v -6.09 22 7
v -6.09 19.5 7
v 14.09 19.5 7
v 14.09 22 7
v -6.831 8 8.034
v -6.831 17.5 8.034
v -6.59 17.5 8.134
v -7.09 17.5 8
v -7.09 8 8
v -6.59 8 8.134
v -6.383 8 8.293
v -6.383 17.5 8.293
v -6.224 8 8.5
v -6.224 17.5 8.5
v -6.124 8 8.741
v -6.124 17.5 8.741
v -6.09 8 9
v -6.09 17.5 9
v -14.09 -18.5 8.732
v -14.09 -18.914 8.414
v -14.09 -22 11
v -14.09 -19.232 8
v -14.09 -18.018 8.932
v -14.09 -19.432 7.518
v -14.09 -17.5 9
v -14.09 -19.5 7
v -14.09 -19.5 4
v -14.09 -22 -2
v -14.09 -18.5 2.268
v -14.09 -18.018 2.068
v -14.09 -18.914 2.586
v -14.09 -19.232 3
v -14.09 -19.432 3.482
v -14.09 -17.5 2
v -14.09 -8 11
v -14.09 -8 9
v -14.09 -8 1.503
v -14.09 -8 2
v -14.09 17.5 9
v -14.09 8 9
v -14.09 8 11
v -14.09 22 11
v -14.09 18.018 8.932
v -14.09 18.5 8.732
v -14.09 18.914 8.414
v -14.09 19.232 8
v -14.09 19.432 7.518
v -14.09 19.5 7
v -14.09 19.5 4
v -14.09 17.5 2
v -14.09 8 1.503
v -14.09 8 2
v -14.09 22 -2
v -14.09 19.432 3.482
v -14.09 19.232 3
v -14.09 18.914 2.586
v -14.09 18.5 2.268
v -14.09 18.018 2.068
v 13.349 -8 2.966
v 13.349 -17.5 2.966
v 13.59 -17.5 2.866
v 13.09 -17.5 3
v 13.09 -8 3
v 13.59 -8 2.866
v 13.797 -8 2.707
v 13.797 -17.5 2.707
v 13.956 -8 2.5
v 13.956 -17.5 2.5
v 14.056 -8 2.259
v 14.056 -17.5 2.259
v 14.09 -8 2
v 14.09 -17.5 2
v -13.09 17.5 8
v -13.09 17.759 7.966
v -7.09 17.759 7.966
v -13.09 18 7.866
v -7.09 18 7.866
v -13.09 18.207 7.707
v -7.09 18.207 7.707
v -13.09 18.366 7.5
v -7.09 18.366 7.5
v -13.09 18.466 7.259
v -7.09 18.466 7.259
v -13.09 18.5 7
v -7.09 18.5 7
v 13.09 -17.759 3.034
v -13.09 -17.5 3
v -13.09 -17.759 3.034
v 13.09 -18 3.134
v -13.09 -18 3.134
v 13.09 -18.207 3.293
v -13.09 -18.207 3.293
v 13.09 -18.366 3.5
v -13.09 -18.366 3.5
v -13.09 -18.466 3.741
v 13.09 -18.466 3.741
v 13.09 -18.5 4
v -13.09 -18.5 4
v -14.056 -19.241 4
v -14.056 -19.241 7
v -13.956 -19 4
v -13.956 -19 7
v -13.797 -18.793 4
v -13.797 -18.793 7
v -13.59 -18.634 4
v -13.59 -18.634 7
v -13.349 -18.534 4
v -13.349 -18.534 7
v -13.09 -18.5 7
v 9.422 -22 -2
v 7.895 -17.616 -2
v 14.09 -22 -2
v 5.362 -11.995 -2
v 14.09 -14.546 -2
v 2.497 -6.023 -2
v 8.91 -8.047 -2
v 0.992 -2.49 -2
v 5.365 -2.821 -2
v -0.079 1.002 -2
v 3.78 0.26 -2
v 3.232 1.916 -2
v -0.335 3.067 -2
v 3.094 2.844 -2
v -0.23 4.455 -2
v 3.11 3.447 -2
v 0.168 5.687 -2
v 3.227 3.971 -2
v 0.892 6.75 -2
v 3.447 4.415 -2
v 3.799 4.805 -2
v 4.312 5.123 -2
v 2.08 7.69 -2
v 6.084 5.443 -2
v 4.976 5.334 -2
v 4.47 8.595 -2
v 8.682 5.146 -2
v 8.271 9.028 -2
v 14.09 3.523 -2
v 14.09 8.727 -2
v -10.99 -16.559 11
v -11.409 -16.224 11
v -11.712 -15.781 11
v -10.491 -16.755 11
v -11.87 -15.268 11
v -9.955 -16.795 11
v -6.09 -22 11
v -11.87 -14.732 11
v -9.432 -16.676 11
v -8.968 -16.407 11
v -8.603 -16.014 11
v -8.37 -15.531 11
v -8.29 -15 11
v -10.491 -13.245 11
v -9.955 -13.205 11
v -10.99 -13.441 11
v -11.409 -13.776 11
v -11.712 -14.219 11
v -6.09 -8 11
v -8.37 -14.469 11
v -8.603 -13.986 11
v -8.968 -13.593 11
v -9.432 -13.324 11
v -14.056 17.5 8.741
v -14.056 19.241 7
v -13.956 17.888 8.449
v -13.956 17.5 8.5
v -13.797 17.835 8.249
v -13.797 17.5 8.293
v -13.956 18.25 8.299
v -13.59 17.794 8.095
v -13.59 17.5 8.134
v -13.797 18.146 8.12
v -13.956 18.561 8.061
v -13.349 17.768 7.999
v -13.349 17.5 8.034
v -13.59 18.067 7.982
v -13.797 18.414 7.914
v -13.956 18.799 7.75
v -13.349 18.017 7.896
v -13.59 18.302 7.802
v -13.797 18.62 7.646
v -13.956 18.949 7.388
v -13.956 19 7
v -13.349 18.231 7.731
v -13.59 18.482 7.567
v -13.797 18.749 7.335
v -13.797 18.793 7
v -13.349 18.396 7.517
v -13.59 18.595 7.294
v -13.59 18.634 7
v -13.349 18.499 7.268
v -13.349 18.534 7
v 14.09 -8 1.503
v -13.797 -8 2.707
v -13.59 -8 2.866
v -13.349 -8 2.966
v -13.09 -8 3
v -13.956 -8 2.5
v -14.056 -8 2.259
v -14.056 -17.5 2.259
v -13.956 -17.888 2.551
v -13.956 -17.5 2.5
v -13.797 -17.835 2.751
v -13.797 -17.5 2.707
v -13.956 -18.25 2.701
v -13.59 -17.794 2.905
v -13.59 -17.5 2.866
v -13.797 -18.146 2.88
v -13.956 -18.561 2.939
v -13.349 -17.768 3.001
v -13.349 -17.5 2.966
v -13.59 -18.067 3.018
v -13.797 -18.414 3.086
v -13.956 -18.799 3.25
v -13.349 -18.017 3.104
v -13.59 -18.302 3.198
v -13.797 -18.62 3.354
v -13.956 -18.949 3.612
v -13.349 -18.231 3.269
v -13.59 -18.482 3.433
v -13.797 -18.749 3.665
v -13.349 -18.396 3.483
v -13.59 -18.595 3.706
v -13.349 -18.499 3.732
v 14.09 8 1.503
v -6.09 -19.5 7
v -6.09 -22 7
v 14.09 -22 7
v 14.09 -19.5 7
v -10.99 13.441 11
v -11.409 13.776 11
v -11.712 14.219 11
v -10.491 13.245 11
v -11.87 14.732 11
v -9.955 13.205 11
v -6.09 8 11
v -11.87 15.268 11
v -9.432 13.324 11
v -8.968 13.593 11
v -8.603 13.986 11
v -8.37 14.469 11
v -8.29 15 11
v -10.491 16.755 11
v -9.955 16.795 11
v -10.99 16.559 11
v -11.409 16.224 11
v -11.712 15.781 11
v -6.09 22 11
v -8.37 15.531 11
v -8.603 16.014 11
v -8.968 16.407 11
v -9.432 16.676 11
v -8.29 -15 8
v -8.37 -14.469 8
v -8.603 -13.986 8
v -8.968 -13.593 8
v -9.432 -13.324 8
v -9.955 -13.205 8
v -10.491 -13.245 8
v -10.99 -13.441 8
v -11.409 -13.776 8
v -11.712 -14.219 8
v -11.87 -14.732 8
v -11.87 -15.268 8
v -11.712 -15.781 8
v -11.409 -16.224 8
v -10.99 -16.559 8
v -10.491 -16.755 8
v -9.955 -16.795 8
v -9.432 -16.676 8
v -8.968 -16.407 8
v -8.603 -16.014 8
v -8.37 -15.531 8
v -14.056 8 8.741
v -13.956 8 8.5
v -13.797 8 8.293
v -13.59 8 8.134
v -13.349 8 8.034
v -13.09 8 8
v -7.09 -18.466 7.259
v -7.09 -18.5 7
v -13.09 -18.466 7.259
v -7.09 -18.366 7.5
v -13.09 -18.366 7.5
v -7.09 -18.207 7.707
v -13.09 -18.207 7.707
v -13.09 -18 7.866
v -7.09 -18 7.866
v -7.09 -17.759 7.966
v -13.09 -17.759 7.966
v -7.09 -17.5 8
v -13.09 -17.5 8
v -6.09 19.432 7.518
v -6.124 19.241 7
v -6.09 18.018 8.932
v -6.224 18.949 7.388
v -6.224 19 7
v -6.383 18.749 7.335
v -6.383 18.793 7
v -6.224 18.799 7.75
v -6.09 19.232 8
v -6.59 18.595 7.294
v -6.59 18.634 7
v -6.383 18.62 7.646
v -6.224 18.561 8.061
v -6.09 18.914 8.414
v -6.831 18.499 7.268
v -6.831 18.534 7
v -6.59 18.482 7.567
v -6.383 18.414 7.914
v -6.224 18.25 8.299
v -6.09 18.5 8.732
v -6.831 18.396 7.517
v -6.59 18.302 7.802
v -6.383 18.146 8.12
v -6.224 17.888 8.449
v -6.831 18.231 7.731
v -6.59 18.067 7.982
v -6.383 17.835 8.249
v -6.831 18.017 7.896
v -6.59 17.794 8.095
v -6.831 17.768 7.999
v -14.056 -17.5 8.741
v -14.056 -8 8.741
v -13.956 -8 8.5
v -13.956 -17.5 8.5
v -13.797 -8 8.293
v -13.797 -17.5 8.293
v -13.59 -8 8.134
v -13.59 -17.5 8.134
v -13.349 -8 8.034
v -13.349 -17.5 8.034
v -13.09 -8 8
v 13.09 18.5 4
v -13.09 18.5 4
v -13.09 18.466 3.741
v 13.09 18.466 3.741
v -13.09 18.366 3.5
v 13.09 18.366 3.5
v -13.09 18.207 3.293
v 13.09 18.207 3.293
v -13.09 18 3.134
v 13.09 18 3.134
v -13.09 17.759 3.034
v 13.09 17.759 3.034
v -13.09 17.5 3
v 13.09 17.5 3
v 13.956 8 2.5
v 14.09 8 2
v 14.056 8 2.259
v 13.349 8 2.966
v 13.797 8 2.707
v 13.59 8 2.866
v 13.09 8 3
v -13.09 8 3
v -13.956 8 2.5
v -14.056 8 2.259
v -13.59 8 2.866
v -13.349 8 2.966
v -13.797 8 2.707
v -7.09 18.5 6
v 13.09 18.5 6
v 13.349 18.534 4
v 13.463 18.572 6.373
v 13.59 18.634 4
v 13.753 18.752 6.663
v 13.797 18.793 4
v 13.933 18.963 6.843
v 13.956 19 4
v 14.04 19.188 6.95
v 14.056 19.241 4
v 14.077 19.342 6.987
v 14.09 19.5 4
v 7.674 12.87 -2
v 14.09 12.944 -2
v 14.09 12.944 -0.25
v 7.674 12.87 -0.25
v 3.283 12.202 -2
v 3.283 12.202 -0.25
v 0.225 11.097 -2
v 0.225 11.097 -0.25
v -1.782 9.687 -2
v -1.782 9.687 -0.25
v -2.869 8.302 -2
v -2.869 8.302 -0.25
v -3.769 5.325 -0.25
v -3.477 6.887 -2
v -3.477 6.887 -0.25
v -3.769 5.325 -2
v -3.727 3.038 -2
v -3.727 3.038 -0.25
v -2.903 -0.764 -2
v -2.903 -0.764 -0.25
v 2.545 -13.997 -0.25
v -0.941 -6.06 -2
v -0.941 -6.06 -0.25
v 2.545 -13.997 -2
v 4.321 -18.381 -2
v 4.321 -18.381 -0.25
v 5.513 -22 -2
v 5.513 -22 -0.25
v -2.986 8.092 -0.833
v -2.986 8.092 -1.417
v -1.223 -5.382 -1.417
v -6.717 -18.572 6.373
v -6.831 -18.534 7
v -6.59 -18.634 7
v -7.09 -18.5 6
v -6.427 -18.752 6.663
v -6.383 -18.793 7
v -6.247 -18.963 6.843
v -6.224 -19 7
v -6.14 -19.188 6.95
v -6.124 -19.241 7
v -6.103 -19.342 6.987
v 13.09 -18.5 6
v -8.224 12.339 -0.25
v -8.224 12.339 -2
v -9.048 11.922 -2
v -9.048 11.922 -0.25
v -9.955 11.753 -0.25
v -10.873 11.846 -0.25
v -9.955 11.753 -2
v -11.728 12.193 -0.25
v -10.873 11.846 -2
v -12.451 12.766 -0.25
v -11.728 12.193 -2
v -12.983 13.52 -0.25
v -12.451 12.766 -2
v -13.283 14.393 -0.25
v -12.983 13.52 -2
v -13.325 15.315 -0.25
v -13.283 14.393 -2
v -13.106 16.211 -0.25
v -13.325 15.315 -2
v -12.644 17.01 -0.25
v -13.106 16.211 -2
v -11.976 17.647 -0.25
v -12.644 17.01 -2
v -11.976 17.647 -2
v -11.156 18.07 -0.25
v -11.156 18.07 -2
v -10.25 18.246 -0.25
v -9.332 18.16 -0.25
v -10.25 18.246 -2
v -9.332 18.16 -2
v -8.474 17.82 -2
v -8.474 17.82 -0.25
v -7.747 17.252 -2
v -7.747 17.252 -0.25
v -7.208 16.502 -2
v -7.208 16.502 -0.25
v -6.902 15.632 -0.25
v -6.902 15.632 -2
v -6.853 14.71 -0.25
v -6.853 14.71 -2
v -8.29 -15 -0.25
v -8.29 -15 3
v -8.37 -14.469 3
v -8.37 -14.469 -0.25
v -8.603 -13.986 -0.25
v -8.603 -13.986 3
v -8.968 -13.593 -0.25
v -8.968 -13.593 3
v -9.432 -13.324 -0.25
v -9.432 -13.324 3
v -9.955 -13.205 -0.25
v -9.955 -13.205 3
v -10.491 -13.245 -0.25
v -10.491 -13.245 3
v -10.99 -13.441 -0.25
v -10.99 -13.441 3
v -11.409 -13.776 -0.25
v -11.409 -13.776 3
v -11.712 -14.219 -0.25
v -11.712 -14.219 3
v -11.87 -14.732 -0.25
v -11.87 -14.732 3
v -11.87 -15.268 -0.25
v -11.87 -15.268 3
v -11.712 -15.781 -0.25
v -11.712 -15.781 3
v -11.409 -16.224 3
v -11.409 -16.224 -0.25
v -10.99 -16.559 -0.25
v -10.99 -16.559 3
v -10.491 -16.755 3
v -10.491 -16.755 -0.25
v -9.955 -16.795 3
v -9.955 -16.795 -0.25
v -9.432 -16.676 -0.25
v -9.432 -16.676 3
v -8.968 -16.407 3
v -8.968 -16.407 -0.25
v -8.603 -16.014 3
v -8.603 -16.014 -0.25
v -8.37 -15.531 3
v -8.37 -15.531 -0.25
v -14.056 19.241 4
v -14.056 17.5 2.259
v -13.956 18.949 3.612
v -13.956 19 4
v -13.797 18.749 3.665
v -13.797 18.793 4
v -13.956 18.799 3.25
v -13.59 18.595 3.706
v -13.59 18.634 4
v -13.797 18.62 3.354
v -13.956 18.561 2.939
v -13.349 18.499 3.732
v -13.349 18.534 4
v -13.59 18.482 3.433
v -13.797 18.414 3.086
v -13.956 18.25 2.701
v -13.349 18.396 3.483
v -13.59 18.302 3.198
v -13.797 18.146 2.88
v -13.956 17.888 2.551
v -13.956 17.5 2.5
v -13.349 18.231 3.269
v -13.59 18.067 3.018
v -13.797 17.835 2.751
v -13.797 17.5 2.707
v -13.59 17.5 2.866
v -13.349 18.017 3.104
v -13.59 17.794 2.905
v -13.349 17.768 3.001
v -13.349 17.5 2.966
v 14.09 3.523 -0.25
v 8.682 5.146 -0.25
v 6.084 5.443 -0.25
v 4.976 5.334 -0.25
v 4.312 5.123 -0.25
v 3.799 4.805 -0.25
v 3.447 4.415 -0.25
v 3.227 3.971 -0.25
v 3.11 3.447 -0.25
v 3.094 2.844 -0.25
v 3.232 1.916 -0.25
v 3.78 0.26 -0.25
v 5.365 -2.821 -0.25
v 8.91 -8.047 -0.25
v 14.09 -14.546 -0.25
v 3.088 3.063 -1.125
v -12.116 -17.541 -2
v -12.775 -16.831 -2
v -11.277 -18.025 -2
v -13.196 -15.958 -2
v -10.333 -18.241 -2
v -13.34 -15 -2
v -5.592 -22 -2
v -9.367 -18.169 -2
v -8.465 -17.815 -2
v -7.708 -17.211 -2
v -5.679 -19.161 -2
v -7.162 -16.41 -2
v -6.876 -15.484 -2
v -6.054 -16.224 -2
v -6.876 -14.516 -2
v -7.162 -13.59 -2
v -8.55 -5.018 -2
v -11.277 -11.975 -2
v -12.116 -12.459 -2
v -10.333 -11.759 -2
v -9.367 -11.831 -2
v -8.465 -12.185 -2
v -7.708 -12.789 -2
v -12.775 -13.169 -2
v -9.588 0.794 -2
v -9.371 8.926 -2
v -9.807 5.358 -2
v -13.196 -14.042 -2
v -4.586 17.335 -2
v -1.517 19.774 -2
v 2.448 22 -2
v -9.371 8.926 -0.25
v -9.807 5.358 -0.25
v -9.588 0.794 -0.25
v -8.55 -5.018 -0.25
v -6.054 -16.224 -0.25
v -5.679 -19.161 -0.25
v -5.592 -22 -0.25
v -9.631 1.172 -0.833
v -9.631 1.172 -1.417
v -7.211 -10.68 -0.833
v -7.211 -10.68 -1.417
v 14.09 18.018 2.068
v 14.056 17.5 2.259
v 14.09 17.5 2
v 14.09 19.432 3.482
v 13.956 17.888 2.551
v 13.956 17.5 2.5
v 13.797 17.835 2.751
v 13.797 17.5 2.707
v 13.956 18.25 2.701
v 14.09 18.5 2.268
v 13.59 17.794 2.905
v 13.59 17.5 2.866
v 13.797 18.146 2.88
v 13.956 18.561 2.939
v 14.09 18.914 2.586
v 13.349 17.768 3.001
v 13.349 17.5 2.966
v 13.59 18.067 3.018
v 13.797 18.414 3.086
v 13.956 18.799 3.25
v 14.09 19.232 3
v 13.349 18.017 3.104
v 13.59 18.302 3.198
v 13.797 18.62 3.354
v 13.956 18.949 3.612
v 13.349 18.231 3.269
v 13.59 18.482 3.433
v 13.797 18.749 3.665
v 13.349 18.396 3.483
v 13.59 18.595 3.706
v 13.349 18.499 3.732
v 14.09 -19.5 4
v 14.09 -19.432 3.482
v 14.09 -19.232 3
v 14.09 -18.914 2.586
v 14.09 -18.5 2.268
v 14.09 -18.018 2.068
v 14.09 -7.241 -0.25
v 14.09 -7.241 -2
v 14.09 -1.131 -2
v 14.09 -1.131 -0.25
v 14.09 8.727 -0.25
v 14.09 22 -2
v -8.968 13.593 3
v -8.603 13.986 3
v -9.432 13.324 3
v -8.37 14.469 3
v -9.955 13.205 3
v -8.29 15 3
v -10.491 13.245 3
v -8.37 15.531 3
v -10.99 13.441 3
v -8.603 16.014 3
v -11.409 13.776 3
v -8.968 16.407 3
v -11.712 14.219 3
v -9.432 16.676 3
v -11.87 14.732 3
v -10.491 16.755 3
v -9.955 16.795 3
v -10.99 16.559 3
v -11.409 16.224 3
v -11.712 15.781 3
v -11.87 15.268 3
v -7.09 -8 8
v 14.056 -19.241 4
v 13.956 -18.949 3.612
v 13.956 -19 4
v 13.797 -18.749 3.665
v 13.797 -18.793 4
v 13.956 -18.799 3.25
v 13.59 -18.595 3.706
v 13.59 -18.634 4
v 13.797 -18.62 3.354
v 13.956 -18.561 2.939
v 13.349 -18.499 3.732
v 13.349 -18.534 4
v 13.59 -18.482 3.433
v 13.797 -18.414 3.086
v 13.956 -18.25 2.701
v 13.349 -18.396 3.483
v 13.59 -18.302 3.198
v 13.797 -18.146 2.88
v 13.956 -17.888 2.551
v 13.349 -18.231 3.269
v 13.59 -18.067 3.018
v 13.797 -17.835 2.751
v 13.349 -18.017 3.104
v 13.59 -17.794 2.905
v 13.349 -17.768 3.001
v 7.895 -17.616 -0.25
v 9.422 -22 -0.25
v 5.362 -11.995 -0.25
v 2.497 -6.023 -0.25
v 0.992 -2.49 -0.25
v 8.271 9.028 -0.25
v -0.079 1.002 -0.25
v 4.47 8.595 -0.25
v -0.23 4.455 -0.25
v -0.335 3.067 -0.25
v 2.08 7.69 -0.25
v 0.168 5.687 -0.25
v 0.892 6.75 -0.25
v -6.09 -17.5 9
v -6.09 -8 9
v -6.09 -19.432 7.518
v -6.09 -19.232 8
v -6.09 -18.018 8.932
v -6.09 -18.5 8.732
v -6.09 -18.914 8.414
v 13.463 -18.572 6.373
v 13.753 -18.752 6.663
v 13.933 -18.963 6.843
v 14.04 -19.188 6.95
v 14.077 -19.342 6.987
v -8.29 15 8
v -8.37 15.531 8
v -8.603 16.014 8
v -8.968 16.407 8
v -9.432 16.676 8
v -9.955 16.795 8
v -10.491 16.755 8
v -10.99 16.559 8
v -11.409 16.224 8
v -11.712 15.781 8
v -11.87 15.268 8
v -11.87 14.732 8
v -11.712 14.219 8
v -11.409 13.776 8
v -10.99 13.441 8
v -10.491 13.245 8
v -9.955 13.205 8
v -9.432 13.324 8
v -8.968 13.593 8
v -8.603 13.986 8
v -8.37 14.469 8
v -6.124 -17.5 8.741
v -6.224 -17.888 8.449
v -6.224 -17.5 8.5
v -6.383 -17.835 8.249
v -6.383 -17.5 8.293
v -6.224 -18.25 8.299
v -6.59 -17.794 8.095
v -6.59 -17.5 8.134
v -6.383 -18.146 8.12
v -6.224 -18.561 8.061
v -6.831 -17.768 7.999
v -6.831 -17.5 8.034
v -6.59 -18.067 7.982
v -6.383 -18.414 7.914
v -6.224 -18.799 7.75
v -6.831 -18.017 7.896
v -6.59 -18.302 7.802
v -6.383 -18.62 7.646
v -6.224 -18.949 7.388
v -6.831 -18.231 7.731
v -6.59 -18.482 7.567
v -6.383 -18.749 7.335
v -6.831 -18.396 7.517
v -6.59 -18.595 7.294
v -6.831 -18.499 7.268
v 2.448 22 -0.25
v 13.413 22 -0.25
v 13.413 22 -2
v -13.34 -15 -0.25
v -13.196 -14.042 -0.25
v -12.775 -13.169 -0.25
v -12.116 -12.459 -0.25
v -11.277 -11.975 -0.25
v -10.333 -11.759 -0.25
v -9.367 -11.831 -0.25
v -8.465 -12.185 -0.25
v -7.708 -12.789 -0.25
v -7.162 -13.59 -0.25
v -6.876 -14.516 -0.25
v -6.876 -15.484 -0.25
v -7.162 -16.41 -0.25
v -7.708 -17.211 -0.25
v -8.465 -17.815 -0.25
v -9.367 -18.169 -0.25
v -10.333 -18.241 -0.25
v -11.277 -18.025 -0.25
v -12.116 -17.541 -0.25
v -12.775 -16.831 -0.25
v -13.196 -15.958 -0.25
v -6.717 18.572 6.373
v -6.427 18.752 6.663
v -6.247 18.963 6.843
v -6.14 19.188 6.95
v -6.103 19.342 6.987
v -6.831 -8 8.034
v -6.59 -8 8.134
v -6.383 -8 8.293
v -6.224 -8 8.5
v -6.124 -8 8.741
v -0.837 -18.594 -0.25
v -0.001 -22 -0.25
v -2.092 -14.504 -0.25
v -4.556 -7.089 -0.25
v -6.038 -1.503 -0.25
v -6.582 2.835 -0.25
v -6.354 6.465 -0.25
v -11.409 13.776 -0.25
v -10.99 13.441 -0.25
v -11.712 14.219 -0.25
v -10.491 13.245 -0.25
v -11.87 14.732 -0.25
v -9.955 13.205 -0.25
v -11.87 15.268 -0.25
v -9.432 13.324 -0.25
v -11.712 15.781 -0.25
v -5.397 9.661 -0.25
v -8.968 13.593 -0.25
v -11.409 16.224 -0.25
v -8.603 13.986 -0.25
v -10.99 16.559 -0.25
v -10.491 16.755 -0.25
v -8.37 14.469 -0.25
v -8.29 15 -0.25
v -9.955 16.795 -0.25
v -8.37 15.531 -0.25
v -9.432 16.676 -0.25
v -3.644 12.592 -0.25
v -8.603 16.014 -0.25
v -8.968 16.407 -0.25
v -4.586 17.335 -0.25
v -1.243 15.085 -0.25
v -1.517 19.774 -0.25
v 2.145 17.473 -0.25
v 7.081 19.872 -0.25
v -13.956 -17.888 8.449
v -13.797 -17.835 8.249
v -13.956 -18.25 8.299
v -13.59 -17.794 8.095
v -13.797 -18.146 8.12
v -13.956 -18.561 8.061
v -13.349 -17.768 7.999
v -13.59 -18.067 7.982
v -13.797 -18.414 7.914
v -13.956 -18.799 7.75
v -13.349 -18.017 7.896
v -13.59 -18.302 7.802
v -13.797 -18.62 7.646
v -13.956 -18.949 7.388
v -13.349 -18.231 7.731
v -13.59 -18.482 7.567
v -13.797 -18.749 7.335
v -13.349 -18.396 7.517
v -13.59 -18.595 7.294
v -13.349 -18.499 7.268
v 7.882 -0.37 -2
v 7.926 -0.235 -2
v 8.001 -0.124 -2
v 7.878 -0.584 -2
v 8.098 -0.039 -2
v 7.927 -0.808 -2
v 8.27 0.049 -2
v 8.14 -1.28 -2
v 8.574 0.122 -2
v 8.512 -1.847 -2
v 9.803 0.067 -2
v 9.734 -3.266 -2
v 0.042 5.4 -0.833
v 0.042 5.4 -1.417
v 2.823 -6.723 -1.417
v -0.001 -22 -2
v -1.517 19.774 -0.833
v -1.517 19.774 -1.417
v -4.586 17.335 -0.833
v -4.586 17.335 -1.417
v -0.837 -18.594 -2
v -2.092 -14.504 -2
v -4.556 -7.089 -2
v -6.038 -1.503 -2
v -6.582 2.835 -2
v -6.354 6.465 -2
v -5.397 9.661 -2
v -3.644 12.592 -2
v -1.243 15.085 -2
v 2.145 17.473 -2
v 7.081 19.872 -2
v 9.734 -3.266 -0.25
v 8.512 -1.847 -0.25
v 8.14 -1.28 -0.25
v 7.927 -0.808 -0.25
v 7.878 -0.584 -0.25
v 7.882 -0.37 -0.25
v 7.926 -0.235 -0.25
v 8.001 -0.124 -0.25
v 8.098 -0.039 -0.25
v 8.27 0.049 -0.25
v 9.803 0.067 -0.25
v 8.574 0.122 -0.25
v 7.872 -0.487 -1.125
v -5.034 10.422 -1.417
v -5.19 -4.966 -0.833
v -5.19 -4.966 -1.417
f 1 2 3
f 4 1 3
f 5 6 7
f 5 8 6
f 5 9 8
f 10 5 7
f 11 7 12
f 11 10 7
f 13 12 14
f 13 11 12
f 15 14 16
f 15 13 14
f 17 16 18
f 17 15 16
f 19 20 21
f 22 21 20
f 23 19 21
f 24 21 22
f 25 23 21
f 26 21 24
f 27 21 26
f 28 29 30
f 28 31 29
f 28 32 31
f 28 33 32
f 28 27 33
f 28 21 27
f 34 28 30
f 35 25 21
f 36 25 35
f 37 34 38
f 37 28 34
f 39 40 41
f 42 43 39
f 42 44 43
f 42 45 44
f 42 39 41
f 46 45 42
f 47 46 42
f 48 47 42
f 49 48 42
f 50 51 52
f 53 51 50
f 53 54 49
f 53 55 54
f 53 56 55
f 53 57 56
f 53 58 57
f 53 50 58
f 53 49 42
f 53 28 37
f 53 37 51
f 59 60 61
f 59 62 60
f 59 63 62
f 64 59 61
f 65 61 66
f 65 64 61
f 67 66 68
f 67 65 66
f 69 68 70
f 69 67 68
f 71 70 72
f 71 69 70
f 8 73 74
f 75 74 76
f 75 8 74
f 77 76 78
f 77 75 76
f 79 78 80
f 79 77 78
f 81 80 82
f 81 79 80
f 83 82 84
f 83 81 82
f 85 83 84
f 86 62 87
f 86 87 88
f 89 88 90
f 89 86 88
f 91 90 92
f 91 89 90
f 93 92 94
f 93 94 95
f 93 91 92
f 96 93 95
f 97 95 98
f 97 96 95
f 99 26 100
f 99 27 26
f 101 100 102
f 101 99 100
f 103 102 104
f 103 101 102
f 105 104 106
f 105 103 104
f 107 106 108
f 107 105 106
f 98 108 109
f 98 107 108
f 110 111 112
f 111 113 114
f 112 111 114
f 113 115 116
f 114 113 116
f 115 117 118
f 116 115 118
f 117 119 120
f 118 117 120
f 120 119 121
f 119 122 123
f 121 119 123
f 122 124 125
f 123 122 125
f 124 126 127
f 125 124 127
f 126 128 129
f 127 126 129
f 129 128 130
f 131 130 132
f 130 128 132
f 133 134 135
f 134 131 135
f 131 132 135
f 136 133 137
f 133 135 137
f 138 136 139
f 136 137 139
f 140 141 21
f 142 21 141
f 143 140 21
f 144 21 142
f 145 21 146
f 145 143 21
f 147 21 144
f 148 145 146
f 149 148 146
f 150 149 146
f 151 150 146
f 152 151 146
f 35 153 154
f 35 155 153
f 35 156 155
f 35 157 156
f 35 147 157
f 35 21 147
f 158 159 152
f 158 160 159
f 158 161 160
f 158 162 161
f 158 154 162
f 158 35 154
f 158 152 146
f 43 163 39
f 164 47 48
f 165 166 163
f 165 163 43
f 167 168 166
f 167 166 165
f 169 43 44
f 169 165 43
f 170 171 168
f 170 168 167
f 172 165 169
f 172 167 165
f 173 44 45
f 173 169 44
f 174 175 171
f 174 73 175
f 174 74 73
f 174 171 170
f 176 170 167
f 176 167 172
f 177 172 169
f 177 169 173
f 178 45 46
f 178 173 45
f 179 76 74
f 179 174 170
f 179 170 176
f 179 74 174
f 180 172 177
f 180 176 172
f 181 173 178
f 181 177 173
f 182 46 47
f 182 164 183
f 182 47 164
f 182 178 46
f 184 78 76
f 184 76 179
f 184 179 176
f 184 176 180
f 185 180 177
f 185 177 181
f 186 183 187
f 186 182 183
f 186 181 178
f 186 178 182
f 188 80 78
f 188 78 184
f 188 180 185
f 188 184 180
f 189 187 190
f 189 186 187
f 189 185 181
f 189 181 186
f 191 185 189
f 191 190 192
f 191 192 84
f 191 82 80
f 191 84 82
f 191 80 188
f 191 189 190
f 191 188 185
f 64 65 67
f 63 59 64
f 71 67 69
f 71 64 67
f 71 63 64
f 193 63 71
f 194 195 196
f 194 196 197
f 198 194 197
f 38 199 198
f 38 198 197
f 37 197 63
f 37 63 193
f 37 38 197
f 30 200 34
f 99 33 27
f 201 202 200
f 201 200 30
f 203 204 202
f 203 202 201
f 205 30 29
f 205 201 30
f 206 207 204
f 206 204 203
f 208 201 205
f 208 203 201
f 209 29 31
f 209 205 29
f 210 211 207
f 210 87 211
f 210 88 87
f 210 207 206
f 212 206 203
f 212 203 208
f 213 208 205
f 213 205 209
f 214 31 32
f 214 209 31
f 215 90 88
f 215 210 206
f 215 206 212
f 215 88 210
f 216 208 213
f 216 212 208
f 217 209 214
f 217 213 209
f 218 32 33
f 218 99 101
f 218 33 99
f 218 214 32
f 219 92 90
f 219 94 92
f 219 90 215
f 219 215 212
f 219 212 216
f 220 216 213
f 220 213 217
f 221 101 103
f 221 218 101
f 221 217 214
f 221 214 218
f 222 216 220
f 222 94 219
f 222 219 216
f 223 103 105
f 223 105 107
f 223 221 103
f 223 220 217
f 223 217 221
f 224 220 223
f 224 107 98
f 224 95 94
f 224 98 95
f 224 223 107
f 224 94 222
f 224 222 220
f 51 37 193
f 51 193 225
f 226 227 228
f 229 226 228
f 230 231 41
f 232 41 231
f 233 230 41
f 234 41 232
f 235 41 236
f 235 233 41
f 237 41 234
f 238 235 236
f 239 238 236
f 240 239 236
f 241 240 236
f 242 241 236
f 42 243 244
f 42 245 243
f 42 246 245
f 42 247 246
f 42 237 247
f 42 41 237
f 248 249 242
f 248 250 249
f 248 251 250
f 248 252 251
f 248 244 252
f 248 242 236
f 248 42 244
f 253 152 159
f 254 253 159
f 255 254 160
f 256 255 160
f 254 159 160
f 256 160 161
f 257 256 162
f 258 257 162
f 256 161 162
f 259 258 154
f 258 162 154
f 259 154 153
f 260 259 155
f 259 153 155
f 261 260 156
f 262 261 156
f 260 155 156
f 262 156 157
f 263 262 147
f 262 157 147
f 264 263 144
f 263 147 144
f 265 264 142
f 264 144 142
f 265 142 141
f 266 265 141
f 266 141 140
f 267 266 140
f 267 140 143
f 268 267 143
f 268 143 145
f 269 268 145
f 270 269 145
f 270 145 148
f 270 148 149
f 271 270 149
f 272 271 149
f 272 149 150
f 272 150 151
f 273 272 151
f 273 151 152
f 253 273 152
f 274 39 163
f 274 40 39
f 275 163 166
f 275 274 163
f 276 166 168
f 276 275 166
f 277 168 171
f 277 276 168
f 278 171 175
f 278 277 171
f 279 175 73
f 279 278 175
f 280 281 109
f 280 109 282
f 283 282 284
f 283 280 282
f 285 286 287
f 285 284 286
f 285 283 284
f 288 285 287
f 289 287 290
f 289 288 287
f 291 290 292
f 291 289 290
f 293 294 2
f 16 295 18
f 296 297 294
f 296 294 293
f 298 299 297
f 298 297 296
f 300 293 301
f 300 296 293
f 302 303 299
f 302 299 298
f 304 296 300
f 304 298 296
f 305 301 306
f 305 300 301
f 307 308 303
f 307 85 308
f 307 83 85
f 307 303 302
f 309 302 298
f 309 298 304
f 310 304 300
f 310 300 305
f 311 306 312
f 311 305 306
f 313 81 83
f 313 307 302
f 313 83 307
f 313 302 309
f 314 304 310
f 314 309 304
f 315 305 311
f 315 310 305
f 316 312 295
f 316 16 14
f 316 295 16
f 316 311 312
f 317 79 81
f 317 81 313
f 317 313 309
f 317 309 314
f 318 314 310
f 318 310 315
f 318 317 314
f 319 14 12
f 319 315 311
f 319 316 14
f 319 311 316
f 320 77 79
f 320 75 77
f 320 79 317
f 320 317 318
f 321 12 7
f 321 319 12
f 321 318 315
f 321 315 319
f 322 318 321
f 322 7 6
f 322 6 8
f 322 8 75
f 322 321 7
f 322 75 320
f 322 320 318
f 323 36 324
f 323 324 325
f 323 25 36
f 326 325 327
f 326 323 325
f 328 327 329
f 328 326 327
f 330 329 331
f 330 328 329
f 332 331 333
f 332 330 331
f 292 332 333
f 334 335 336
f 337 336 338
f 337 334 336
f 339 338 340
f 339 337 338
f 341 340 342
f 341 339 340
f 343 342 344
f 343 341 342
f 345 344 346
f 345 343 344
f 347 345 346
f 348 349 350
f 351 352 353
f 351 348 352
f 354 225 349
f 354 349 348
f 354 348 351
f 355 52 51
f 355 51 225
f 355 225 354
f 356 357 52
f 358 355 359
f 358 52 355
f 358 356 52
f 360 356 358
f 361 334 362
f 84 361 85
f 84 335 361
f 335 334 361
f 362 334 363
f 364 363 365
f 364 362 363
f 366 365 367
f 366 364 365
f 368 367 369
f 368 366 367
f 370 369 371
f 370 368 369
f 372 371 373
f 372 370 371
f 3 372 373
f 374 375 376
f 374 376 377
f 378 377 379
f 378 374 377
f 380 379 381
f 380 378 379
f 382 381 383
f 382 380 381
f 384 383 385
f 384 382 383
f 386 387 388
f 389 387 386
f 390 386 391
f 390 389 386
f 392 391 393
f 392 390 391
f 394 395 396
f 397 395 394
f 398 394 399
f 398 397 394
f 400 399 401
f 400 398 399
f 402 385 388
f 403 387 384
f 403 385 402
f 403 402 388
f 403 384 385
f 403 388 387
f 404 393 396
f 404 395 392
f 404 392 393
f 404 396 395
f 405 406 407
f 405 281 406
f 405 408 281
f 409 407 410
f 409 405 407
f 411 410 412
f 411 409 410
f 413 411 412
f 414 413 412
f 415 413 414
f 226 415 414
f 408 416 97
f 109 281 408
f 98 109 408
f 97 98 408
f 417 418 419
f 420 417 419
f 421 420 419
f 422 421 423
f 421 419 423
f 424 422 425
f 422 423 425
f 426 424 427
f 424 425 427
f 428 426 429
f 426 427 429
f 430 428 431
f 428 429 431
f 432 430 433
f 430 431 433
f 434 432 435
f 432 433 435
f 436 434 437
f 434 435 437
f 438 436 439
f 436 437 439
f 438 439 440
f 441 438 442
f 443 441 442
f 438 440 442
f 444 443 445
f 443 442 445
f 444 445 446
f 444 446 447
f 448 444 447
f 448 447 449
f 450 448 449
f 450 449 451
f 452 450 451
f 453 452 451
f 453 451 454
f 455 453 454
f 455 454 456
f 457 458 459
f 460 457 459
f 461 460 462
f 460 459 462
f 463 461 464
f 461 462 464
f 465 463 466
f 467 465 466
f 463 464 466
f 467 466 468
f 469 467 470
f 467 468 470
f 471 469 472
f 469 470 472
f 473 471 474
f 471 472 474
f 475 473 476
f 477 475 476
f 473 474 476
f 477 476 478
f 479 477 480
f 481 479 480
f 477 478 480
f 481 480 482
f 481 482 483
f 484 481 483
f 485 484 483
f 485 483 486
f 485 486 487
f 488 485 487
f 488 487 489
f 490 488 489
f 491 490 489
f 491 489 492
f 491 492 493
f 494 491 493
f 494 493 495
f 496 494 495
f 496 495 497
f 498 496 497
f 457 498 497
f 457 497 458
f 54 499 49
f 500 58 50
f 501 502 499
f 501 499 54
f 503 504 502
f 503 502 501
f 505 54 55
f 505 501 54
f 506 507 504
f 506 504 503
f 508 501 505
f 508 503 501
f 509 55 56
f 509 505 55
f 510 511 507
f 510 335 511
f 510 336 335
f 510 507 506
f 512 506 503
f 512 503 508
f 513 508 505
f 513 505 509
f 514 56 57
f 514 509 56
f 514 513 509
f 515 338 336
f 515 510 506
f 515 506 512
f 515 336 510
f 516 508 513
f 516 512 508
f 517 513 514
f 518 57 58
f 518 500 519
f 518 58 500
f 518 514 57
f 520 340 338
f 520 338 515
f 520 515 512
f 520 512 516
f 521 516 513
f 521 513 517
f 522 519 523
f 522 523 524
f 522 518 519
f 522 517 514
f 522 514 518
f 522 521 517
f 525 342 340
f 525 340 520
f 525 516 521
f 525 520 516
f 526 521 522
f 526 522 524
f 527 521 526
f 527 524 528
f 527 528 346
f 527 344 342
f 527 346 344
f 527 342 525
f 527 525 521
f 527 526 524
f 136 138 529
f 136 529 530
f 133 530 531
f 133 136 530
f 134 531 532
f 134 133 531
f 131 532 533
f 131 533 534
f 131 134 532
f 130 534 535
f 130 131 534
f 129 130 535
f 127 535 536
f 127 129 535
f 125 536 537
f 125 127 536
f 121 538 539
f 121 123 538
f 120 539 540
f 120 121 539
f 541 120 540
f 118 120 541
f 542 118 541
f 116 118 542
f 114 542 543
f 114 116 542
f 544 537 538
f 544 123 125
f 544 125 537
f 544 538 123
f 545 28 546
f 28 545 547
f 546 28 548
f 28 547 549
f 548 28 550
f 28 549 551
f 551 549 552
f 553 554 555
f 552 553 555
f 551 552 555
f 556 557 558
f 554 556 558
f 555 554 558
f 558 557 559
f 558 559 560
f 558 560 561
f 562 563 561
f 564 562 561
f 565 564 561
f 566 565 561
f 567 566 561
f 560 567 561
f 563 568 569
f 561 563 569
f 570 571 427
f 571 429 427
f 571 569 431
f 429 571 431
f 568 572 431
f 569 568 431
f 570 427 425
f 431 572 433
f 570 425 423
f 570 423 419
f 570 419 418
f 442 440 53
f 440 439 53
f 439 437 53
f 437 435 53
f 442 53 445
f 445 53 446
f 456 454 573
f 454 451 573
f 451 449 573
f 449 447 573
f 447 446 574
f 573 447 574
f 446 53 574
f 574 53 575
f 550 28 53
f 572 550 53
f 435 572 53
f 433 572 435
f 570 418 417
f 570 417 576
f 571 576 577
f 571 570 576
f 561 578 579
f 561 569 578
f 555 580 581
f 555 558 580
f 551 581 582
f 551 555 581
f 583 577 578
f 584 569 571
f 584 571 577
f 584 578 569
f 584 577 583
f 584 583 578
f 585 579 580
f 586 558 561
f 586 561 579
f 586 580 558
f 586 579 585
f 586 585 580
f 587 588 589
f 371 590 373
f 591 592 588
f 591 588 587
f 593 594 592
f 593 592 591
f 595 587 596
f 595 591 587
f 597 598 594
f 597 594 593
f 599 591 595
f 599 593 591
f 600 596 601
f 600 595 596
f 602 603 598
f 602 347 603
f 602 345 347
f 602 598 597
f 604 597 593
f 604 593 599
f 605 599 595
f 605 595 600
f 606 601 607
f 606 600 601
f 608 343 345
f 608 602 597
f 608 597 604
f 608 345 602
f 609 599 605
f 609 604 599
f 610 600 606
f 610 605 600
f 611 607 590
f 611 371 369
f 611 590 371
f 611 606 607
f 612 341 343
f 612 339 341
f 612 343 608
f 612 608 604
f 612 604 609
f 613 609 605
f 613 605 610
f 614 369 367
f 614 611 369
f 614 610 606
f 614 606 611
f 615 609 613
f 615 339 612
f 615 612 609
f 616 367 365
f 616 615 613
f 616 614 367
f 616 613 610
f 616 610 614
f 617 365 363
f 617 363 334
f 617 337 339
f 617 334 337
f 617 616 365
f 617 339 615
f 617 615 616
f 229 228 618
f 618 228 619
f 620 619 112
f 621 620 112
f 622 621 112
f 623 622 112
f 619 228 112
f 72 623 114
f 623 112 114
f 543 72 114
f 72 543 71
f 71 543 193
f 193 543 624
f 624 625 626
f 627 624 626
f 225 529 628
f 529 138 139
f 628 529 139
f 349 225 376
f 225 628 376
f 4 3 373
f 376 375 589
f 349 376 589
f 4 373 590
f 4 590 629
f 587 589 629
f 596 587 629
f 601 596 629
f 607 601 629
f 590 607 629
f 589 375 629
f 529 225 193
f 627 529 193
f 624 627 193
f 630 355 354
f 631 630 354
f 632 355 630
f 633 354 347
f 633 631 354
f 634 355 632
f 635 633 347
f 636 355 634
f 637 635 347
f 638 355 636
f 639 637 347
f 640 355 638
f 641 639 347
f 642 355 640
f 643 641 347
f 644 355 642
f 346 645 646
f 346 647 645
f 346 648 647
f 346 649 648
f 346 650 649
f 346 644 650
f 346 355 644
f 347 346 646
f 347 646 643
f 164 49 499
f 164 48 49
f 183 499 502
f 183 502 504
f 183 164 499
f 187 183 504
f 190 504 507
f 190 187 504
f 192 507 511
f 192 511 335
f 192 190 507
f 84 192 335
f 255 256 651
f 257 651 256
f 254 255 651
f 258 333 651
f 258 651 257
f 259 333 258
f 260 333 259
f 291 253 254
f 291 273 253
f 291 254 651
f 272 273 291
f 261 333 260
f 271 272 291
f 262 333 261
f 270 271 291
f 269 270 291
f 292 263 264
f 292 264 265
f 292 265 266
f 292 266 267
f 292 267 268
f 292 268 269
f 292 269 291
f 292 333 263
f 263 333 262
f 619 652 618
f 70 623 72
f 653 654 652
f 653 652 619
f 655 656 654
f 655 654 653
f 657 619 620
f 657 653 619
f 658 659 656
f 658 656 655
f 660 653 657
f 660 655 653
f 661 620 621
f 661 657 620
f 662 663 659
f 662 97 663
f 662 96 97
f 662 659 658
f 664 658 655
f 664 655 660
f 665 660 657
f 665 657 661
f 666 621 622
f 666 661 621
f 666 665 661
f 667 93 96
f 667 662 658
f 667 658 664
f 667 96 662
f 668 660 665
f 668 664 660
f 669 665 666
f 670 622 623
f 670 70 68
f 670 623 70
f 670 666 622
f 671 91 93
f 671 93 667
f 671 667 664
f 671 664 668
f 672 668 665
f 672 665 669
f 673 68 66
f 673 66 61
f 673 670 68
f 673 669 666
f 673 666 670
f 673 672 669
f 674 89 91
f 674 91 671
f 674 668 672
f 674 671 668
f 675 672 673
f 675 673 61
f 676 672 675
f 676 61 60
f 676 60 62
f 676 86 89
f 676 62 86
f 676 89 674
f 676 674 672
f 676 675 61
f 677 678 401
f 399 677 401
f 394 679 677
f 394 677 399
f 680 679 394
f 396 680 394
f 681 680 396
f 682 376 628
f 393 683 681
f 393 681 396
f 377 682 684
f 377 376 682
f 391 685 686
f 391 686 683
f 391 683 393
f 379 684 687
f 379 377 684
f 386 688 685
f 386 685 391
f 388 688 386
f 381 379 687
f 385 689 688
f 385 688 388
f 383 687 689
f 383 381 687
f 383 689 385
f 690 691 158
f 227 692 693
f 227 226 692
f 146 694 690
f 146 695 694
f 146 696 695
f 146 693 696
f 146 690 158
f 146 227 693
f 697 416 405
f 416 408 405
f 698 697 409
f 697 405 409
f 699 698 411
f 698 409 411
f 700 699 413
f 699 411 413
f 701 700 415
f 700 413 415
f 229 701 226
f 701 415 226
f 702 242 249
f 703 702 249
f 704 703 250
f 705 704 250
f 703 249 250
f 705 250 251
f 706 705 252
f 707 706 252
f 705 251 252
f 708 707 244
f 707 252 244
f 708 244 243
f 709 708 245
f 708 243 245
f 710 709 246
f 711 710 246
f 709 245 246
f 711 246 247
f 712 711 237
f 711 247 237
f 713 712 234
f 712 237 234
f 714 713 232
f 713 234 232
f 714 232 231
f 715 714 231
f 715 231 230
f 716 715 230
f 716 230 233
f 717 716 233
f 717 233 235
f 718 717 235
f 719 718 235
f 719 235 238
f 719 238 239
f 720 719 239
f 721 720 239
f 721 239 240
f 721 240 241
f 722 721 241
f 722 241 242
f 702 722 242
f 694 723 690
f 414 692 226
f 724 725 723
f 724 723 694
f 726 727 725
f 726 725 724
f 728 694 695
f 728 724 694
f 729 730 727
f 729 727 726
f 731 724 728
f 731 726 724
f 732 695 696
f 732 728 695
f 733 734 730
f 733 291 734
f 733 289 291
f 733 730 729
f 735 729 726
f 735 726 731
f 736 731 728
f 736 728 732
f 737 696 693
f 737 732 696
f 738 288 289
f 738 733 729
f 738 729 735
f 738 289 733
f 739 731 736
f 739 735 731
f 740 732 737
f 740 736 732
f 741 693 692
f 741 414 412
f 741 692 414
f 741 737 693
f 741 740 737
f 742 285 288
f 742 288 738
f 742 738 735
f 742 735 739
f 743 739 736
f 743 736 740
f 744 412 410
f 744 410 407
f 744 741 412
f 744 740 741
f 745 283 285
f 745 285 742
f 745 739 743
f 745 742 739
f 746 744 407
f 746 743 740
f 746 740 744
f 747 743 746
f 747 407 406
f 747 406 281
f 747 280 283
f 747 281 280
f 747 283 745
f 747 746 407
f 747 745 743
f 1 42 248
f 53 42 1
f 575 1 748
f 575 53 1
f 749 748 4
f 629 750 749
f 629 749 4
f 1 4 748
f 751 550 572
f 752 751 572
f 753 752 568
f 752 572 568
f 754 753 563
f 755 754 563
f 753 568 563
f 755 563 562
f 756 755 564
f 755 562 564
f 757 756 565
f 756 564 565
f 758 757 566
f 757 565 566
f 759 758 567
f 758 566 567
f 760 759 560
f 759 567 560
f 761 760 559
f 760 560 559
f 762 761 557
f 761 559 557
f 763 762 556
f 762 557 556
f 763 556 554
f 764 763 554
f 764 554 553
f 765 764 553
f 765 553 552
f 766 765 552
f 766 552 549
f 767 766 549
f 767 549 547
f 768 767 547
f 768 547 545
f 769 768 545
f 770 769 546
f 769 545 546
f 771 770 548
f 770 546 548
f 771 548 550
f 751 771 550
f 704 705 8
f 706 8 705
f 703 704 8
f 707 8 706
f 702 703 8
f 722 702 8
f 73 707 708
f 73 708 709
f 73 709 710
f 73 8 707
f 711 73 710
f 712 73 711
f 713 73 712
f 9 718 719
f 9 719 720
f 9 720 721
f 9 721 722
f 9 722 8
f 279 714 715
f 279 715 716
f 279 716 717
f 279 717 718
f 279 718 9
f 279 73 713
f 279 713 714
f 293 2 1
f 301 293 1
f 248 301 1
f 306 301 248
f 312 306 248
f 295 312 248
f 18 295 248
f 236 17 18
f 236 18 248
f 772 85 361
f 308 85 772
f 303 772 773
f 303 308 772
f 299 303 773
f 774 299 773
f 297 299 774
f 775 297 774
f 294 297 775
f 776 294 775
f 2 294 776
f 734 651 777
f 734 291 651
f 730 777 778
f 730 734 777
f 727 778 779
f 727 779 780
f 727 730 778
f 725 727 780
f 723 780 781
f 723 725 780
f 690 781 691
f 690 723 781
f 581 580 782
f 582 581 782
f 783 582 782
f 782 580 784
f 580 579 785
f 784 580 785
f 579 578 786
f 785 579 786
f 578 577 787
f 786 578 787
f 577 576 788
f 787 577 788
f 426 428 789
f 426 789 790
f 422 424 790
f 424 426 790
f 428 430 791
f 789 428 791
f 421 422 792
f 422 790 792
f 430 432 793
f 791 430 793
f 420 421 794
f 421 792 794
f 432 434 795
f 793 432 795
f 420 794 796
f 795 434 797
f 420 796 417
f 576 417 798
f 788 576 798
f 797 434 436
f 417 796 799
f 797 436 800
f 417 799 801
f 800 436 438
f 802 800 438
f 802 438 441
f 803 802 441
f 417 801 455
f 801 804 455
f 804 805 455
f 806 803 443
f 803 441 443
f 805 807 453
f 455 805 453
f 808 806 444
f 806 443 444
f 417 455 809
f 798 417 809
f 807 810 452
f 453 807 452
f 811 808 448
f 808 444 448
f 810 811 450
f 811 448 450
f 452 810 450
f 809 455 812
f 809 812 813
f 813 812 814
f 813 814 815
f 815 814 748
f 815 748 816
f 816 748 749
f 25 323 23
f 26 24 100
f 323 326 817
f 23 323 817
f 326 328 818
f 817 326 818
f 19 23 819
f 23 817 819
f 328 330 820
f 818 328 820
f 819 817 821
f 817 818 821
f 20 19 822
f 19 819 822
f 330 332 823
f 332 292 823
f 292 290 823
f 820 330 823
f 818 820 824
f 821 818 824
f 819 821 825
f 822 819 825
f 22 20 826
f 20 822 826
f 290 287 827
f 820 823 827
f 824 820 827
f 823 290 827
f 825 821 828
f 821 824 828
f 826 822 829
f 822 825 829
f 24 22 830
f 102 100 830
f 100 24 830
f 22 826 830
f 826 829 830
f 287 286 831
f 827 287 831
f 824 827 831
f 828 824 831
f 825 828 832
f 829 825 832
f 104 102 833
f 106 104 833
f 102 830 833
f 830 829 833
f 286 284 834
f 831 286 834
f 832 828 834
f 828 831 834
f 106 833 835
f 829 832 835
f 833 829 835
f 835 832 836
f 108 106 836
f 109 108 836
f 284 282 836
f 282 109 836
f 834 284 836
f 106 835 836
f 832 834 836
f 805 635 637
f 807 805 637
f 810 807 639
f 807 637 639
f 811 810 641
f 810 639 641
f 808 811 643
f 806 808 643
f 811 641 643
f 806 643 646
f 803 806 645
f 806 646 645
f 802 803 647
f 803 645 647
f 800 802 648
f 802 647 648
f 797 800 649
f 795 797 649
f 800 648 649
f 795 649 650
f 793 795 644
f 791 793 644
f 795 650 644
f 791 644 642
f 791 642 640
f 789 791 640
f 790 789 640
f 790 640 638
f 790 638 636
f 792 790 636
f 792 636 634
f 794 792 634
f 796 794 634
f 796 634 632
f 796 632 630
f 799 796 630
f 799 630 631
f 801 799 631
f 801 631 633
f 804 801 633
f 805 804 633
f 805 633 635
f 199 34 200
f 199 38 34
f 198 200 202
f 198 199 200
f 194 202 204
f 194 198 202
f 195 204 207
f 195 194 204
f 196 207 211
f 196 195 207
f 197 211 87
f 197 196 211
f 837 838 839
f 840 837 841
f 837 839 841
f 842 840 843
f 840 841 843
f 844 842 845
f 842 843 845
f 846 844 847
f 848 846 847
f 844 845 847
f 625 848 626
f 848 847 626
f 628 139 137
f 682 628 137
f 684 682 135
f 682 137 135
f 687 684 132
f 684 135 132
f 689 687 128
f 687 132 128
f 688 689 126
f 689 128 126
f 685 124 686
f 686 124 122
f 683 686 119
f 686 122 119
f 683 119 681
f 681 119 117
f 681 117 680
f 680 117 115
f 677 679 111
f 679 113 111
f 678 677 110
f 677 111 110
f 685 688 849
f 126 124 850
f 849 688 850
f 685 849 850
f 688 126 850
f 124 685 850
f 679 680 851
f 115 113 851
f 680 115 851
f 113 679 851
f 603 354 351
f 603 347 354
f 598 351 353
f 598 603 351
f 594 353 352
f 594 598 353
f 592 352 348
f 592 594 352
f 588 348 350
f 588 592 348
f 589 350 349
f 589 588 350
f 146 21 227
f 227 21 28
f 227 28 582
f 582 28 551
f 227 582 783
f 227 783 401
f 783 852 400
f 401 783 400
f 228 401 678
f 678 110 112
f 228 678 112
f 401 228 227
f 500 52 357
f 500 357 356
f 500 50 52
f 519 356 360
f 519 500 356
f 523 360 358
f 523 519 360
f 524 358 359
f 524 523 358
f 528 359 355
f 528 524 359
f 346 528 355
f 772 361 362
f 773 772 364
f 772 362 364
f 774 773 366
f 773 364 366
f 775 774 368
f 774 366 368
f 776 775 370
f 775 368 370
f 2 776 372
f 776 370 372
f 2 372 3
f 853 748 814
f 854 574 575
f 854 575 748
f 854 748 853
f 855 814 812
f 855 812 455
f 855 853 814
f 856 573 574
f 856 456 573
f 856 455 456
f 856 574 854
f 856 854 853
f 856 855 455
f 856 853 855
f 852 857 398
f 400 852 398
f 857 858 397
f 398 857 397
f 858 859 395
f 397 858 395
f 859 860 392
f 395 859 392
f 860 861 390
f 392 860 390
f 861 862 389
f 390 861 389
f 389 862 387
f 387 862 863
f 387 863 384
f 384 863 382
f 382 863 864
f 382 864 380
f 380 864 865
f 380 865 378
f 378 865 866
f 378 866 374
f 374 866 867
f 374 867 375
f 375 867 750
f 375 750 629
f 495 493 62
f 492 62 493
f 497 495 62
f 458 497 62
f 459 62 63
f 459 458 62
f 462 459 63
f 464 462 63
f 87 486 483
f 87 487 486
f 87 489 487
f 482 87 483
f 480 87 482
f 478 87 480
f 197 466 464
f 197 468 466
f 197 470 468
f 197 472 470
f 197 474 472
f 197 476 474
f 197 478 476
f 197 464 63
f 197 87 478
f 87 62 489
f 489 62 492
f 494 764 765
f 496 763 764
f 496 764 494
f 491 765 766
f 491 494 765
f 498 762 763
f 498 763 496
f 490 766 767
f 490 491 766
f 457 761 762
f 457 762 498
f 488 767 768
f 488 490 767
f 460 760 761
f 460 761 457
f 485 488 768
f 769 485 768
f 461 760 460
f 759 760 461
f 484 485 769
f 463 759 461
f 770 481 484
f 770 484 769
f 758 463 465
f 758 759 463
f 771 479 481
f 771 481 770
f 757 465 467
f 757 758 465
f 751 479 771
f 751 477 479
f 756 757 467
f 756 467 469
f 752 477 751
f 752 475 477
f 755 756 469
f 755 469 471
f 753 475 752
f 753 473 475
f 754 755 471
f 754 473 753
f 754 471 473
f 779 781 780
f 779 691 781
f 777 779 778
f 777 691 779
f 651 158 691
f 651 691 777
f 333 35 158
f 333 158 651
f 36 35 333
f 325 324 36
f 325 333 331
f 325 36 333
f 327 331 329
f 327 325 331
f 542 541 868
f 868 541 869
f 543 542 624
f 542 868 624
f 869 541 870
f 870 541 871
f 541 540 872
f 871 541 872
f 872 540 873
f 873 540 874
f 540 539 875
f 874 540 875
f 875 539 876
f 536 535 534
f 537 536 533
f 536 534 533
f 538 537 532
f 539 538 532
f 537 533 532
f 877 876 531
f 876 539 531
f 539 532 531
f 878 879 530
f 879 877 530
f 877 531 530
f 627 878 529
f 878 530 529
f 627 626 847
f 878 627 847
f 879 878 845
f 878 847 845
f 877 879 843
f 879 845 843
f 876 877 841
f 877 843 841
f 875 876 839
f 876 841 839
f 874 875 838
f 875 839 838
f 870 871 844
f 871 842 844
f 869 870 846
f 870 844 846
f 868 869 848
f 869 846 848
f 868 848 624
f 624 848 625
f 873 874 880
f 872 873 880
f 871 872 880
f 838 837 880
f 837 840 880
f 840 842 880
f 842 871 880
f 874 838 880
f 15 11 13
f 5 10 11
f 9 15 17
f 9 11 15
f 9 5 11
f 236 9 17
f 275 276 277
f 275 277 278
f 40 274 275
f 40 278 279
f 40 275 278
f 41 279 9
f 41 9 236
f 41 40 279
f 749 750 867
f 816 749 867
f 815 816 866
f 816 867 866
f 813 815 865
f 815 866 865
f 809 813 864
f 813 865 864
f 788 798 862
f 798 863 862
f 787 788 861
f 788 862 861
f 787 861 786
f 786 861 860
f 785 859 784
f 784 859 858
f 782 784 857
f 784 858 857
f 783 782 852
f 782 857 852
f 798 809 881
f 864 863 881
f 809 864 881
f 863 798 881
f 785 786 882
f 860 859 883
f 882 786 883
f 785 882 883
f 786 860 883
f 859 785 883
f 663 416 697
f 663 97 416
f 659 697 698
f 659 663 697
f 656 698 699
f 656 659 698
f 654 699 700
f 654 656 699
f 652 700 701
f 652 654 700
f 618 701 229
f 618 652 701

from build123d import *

# Parameters (mm, degrees)
BOSS_EXTRUDE1_DEPTH      = 11
BOSS_EXTRUDE1_DEPTH_BACK = 2
SKETCH1_W                = 28.18
SKETCH1_H                = 44
CUT_EXTRUDE1_DEPTH       = 37
SKETCH4_W                = 20.18
SKETCH4_H                = 4
CUT_EXTRUDE2_DEPTH       = 48
CUT_EXTRUDE3_DEPTH       = 1.75
SKETCH7_R                = 1.8
CUT_EXTRUDE4_DEPTH       = 23
FILLET1_R                = 1
SKETCH8_R                = 3.25
CUT_EXTRUDE5_DEPTH       = 1.75


with BuildPart() as part:
    # Sketch1 → Boss-Extrude1 (new, two sides: drawn at the far end of the back side and taken through both)
    with BuildSketch(Plane.XY.offset(-BOSS_EXTRUDE1_DEPTH_BACK)):
        Rectangle(SKETCH1_W, SKETCH1_H)
    extrude(amount=BOSS_EXTRUDE1_DEPTH + BOSS_EXTRUDE1_DEPTH_BACK)

    # Sketch3 → Cut-Extrude1 (cut)
    with BuildSketch(Plane.ZY.offset(14.09)):
        Polygon((8, 8), (11, 8), (11, -8), (8, -8), (8, -18.5), (3, -18.5), (3, -8), (1.5033938, -8), (1.5033938, 8), (3, 8), (3, 18.5), (8, 18.5), align=None)
    extrude(amount=-CUT_EXTRUDE1_DEPTH, mode=Mode.SUBTRACT)

    # Sketch4 → Cut-Extrude2 (cut)
    with BuildSketch(Plane.XZ.offset(22)):
        with Locations((4, 9)):
            Rectangle(SKETCH4_W, SKETCH4_H)
    extrude(amount=-CUT_EXTRUDE2_DEPTH, mode=Mode.SUBTRACT)

    # Sketch5 → Cut-Extrude3 (cut)
    with BuildSketch(Plane(origin=(0, 0, -2), x_dir=(-1, 0, 0), z_dir=(0, 0, -1))):
        with BuildLine():
            Line((-9.422350513, -22), (-5.513274624, -22))
            add(Edge.make_bspline(
                [(-14.09, 12.943541527), (17.027152303, 14.230895657), (-0.913223026, -5.637747584), (-5.513274624, -22)],
                knots=[0, 0, 0, 0, 0.88215351, 0.88215351, 0.88215351, 0.88215351], degree=3))
            Line((-14.09, 12.943541527), (-14.09, 8.727219843))
            add(Edge.make_bspline(
                [(-14.09, 8.727219843), (12.710361443, 11.678555955), (-5.250487577, -7.026945605), (-9.422350513, -22)],
                knots=[0, 0, 0, 0, 0.871233208, 0.871233208, 0.871233208, 0.871233208], degree=3))
        make_face()
        with BuildLine():
            add(Edge.make_bspline(
                [(-14.09, 3.523280295), (7.913446573, 11.6376574), (-14.09, -14.545652593)],
                knots=[0, 0, 0, 1, 1, 1], degree=2))
            Line((-14.09, 3.523280295), (-14.09, -1.131328535))
            add(Edge.make_bspline(
                [(-14.09, -1.131328535), (-1.654052468, 3.211926994), (-14.09, -7.240502624)],
                knots=[0, 0, 0, 1, 1, 1], degree=2))
            Line((-14.09, -7.240502624), (-14.09, -14.545652593))
        make_face()
        with BuildLine():
            add(Edge.make_bspline(
                [(-2.448223174, 22), (19.56705897, 11.536361781), (5.151599528, -7.62224079), (5.592236917, -22)],
                knots=[0, 0, 0, 0, 0.832841206, 0.832841206, 0.832841206, 0.832841206], degree=3))
            Line((-2.448223174, 22), (-13.413117725, 22))
            add(Edge.make_bspline(
                [(-13.413117725, 22), (18.496116363, 13.047461166), (3.546154763, -4.863207343), (0.001206333, -22)],
                knots=[0, 0, 0, 0, 0.886771983, 0.886771983, 0.886771983, 0.886771983], degree=3))
            Line((0.001206333, -22), (5.592236917, -22))
        make_face()
    extrude(amount=-CUT_EXTRUDE3_DEPTH, mode=Mode.SUBTRACT)

    # Sketch7 → Cut-Extrude4 (cut)
    with BuildSketch(Plane.XY.offset(11)):
        with Locations((-10.09, 15)):
            Circle(SKETCH7_R)
        with Locations((-10.09, -15)):
            Circle(SKETCH7_R)
    extrude(amount=-CUT_EXTRUDE4_DEPTH, mode=Mode.SUBTRACT)

    # Fillet1
    fillet1_edges = [part.edges().sort_by_distance(p)[0] for p in [
        (-14.09, -13.25, 3),
        (-14.09, -13.25, 8),
        (14.09, -13.25, 3),
        (-6.09, -13.25, 8),
        (14.09, 13.25, 3),
        (-14.09, 13.25, 3),
        (-14.09, 13.25, 8),
        (-6.09, 13.25, 8),
        (-14.09, -18.5, 5.5),
        (0, -18.5, 3),
        (14.09, -18.5, 5),
        (4, -18.5, 7),
        (-6.09, -18.5, 7.5),
        (-10.09, -18.5, 8),
        (14.09, 18.5, 5),
        (0, 18.5, 3),
        (-14.09, 18.5, 5.5),
        (-10.09, 18.5, 8),
        (-6.09, 18.5, 7.5),
        (4, 18.5, 7),
    ]]
    fillet(fillet1_edges, radius=FILLET1_R - 0.0001)  # a hair under: the kernel refuses the full size

    # Sketch8 → Cut-Extrude5 (cut)
    with BuildSketch(Plane(origin=(0, 0, -2), x_dir=(-1, 0, 0), z_dir=(0, 0, -1))):
        with Locations((10.09, -15)):
            Circle(SKETCH8_R)
        with Locations((10.09, 15)):
            Circle(SKETCH8_R)
    extrude(amount=-CUT_EXTRUDE5_DEPTH, mode=Mode.SUBTRACT)


solid = part.part
